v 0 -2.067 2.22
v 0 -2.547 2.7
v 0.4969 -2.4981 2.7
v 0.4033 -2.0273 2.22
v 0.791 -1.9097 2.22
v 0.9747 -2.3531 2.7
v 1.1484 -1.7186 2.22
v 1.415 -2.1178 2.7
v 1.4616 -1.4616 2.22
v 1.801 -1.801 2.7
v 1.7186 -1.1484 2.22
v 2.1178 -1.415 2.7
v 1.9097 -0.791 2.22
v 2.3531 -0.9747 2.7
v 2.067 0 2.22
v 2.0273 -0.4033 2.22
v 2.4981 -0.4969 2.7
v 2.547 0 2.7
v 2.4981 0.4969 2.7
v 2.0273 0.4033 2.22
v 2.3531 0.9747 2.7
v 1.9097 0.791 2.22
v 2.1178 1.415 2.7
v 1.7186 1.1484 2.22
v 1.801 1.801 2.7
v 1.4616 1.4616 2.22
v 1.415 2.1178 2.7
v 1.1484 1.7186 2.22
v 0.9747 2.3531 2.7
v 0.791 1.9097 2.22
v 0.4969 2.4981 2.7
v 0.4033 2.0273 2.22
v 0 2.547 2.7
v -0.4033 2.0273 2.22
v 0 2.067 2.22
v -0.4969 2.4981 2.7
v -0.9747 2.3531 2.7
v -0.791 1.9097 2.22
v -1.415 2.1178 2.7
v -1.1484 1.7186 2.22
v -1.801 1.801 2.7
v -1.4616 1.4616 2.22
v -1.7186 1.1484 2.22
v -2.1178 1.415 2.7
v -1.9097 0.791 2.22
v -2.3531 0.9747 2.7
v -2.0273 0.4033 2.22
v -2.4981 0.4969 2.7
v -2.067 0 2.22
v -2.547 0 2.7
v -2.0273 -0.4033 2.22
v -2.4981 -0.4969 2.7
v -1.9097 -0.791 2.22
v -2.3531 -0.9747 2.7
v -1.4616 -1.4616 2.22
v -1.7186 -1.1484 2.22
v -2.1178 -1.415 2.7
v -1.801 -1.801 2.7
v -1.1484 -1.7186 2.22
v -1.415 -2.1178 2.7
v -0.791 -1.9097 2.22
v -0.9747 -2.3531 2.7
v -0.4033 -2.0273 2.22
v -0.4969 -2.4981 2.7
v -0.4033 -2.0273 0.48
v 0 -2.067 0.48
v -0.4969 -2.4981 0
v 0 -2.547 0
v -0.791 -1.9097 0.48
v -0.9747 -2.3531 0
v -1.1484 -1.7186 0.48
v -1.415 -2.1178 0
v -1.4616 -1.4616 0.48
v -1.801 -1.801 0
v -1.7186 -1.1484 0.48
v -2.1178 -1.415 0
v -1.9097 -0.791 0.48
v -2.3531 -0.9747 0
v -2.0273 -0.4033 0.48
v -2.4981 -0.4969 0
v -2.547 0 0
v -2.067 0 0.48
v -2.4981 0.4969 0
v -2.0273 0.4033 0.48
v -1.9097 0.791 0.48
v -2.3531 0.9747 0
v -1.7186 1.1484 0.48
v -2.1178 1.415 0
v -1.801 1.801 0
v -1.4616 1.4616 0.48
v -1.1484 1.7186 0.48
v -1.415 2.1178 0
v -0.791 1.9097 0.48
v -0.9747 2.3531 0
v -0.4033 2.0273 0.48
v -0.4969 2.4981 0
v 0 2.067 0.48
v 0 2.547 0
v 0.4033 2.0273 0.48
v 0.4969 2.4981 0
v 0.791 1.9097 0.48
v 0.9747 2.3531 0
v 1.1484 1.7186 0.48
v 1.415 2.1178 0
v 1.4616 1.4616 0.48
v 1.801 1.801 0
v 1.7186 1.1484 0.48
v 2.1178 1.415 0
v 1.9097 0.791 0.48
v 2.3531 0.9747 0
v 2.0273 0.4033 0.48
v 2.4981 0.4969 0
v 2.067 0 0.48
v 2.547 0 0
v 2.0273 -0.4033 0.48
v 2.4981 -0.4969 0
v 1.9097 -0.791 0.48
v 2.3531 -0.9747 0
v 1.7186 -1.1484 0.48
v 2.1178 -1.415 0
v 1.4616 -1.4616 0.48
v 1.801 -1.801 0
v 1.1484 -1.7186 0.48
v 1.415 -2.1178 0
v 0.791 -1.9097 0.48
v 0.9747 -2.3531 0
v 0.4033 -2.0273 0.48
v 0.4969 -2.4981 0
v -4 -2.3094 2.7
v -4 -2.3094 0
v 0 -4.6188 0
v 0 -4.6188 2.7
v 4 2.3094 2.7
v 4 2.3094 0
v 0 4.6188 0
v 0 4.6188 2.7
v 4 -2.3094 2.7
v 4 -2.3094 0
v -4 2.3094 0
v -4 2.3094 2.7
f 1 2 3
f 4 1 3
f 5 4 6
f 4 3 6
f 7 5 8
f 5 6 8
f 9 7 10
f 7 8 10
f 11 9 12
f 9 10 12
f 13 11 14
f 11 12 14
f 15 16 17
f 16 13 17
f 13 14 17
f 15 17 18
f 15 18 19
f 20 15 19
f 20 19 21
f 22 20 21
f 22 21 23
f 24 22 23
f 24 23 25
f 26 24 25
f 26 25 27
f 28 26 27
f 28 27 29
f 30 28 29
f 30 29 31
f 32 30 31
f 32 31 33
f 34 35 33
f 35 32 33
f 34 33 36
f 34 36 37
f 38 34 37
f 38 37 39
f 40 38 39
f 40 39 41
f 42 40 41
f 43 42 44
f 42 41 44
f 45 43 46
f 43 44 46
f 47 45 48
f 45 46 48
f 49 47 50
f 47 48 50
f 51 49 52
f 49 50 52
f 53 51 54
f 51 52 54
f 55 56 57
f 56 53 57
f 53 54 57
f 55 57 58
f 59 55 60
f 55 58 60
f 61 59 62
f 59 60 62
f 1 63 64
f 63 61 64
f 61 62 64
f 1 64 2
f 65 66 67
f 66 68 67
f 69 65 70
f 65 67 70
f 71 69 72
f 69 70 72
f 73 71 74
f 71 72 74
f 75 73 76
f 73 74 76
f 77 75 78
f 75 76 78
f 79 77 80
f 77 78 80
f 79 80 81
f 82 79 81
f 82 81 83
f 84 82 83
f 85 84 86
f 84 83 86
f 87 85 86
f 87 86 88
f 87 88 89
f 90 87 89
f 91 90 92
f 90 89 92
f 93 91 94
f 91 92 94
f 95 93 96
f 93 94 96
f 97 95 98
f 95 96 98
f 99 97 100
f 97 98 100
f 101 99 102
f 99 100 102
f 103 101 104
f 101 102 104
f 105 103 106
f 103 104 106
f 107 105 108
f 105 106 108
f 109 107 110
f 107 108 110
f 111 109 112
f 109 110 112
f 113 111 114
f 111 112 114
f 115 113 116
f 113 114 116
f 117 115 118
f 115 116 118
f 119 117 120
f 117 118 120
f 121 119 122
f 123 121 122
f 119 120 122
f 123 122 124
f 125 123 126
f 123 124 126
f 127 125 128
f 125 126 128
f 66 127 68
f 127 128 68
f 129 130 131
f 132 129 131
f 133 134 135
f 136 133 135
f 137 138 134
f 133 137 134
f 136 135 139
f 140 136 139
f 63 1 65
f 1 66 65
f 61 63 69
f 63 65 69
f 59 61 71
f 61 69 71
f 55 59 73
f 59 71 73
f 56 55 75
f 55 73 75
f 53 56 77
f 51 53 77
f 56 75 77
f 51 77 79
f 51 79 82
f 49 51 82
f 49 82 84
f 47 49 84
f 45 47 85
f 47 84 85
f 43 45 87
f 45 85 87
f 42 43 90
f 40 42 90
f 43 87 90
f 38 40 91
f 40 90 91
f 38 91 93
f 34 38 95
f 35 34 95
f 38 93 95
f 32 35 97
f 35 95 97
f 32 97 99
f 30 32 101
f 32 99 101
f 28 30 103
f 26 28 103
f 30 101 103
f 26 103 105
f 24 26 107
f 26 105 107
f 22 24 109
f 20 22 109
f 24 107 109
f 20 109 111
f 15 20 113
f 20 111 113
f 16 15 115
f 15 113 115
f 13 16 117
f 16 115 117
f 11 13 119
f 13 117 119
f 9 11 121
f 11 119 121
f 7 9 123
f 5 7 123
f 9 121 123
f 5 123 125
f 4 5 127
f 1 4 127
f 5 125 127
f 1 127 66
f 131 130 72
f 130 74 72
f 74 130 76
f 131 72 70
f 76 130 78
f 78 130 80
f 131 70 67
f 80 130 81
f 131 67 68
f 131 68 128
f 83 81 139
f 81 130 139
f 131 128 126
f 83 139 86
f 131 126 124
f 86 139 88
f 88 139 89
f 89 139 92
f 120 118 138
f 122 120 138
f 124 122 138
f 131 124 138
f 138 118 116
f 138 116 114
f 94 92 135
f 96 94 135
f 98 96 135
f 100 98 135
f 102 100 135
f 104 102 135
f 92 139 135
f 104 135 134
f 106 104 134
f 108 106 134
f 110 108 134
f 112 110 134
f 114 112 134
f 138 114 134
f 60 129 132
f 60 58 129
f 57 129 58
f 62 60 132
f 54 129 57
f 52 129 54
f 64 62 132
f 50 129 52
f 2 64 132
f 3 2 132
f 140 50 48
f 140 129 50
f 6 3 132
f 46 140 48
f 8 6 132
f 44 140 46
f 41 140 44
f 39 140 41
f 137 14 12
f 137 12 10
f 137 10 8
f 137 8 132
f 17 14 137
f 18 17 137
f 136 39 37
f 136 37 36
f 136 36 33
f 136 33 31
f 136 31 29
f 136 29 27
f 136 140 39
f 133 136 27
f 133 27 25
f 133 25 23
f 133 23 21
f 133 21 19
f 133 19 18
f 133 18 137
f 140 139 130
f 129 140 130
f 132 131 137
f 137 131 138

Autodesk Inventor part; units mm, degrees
sketch "Sketch1" plane through (0, 0, 0) normal (0, 0, 1) x (1, 0, 0)
  circle A0 centre (0, 0) radius 4 construction
  line L0 (-4, 2.3094) -> (-4, -2.3094)
  line L1 (-4, -2.3094) -> (0, -4.6188)
  line L2 (0, -4.6188) -> (4, -2.3094)
  line L3 (4, -2.3094) -> (4, 2.3094)
  line L4 (4, 2.3094) -> (0, 4.6188)
  line L5 (0, 4.6188) -> (-4, 2.3094)
  line L6 (0, 6.4663) -> (0, -6.4663) projected
  line L7 (-5.6, 0) -> (5.6, 0) projected
  point P0 (0, 0)
  dimension "ParS" = 8
extrude "Extrusion1" add sketch "Sketch1" along normal blind 2.7
sketch "Sketch2" plane through (0, 0, 2.7) normal (0, 0, 1) x (1, 0, 0)
  point P0 (0, 0)
  point P1 (0, 0)
hole "Hole1" at (0, 0, 2.7) direction (0, 0, -1) diameter 4.134 end through all thread size "M5x0.8" class "6H" standard "ISO Metric profile"
ref_plane "MSC_PT1" through (0, 0, 2.7) normal (0, 0, 1) x (1, 0, 0)
ref_plane "MSC_PT2" through (0, 0, 0) normal (0, 0, -1) x (-1, 0, 0)
ref_plane "MSC_PF1" through (0, 0, 0) normal (1, 0, 0) x (0, 1, 0)
chamfer "Chamfer1" distance 0.48 angle 45 2 edges at (0, 2.067, 2.7) (0, 2.067, 0)
equation "\"d17\" = 0.6 * PTC"
equation "\"d18\" = 0.6 * PTC"
equation "\"d4\" = M"
equation "\"PTC\" = 0.8"
equation "\"NND\" = 5"
equation "\"THREADDIA\" = NND"
properties part number "CSN EN 24 036 - M5" material "Steel, Mild"
